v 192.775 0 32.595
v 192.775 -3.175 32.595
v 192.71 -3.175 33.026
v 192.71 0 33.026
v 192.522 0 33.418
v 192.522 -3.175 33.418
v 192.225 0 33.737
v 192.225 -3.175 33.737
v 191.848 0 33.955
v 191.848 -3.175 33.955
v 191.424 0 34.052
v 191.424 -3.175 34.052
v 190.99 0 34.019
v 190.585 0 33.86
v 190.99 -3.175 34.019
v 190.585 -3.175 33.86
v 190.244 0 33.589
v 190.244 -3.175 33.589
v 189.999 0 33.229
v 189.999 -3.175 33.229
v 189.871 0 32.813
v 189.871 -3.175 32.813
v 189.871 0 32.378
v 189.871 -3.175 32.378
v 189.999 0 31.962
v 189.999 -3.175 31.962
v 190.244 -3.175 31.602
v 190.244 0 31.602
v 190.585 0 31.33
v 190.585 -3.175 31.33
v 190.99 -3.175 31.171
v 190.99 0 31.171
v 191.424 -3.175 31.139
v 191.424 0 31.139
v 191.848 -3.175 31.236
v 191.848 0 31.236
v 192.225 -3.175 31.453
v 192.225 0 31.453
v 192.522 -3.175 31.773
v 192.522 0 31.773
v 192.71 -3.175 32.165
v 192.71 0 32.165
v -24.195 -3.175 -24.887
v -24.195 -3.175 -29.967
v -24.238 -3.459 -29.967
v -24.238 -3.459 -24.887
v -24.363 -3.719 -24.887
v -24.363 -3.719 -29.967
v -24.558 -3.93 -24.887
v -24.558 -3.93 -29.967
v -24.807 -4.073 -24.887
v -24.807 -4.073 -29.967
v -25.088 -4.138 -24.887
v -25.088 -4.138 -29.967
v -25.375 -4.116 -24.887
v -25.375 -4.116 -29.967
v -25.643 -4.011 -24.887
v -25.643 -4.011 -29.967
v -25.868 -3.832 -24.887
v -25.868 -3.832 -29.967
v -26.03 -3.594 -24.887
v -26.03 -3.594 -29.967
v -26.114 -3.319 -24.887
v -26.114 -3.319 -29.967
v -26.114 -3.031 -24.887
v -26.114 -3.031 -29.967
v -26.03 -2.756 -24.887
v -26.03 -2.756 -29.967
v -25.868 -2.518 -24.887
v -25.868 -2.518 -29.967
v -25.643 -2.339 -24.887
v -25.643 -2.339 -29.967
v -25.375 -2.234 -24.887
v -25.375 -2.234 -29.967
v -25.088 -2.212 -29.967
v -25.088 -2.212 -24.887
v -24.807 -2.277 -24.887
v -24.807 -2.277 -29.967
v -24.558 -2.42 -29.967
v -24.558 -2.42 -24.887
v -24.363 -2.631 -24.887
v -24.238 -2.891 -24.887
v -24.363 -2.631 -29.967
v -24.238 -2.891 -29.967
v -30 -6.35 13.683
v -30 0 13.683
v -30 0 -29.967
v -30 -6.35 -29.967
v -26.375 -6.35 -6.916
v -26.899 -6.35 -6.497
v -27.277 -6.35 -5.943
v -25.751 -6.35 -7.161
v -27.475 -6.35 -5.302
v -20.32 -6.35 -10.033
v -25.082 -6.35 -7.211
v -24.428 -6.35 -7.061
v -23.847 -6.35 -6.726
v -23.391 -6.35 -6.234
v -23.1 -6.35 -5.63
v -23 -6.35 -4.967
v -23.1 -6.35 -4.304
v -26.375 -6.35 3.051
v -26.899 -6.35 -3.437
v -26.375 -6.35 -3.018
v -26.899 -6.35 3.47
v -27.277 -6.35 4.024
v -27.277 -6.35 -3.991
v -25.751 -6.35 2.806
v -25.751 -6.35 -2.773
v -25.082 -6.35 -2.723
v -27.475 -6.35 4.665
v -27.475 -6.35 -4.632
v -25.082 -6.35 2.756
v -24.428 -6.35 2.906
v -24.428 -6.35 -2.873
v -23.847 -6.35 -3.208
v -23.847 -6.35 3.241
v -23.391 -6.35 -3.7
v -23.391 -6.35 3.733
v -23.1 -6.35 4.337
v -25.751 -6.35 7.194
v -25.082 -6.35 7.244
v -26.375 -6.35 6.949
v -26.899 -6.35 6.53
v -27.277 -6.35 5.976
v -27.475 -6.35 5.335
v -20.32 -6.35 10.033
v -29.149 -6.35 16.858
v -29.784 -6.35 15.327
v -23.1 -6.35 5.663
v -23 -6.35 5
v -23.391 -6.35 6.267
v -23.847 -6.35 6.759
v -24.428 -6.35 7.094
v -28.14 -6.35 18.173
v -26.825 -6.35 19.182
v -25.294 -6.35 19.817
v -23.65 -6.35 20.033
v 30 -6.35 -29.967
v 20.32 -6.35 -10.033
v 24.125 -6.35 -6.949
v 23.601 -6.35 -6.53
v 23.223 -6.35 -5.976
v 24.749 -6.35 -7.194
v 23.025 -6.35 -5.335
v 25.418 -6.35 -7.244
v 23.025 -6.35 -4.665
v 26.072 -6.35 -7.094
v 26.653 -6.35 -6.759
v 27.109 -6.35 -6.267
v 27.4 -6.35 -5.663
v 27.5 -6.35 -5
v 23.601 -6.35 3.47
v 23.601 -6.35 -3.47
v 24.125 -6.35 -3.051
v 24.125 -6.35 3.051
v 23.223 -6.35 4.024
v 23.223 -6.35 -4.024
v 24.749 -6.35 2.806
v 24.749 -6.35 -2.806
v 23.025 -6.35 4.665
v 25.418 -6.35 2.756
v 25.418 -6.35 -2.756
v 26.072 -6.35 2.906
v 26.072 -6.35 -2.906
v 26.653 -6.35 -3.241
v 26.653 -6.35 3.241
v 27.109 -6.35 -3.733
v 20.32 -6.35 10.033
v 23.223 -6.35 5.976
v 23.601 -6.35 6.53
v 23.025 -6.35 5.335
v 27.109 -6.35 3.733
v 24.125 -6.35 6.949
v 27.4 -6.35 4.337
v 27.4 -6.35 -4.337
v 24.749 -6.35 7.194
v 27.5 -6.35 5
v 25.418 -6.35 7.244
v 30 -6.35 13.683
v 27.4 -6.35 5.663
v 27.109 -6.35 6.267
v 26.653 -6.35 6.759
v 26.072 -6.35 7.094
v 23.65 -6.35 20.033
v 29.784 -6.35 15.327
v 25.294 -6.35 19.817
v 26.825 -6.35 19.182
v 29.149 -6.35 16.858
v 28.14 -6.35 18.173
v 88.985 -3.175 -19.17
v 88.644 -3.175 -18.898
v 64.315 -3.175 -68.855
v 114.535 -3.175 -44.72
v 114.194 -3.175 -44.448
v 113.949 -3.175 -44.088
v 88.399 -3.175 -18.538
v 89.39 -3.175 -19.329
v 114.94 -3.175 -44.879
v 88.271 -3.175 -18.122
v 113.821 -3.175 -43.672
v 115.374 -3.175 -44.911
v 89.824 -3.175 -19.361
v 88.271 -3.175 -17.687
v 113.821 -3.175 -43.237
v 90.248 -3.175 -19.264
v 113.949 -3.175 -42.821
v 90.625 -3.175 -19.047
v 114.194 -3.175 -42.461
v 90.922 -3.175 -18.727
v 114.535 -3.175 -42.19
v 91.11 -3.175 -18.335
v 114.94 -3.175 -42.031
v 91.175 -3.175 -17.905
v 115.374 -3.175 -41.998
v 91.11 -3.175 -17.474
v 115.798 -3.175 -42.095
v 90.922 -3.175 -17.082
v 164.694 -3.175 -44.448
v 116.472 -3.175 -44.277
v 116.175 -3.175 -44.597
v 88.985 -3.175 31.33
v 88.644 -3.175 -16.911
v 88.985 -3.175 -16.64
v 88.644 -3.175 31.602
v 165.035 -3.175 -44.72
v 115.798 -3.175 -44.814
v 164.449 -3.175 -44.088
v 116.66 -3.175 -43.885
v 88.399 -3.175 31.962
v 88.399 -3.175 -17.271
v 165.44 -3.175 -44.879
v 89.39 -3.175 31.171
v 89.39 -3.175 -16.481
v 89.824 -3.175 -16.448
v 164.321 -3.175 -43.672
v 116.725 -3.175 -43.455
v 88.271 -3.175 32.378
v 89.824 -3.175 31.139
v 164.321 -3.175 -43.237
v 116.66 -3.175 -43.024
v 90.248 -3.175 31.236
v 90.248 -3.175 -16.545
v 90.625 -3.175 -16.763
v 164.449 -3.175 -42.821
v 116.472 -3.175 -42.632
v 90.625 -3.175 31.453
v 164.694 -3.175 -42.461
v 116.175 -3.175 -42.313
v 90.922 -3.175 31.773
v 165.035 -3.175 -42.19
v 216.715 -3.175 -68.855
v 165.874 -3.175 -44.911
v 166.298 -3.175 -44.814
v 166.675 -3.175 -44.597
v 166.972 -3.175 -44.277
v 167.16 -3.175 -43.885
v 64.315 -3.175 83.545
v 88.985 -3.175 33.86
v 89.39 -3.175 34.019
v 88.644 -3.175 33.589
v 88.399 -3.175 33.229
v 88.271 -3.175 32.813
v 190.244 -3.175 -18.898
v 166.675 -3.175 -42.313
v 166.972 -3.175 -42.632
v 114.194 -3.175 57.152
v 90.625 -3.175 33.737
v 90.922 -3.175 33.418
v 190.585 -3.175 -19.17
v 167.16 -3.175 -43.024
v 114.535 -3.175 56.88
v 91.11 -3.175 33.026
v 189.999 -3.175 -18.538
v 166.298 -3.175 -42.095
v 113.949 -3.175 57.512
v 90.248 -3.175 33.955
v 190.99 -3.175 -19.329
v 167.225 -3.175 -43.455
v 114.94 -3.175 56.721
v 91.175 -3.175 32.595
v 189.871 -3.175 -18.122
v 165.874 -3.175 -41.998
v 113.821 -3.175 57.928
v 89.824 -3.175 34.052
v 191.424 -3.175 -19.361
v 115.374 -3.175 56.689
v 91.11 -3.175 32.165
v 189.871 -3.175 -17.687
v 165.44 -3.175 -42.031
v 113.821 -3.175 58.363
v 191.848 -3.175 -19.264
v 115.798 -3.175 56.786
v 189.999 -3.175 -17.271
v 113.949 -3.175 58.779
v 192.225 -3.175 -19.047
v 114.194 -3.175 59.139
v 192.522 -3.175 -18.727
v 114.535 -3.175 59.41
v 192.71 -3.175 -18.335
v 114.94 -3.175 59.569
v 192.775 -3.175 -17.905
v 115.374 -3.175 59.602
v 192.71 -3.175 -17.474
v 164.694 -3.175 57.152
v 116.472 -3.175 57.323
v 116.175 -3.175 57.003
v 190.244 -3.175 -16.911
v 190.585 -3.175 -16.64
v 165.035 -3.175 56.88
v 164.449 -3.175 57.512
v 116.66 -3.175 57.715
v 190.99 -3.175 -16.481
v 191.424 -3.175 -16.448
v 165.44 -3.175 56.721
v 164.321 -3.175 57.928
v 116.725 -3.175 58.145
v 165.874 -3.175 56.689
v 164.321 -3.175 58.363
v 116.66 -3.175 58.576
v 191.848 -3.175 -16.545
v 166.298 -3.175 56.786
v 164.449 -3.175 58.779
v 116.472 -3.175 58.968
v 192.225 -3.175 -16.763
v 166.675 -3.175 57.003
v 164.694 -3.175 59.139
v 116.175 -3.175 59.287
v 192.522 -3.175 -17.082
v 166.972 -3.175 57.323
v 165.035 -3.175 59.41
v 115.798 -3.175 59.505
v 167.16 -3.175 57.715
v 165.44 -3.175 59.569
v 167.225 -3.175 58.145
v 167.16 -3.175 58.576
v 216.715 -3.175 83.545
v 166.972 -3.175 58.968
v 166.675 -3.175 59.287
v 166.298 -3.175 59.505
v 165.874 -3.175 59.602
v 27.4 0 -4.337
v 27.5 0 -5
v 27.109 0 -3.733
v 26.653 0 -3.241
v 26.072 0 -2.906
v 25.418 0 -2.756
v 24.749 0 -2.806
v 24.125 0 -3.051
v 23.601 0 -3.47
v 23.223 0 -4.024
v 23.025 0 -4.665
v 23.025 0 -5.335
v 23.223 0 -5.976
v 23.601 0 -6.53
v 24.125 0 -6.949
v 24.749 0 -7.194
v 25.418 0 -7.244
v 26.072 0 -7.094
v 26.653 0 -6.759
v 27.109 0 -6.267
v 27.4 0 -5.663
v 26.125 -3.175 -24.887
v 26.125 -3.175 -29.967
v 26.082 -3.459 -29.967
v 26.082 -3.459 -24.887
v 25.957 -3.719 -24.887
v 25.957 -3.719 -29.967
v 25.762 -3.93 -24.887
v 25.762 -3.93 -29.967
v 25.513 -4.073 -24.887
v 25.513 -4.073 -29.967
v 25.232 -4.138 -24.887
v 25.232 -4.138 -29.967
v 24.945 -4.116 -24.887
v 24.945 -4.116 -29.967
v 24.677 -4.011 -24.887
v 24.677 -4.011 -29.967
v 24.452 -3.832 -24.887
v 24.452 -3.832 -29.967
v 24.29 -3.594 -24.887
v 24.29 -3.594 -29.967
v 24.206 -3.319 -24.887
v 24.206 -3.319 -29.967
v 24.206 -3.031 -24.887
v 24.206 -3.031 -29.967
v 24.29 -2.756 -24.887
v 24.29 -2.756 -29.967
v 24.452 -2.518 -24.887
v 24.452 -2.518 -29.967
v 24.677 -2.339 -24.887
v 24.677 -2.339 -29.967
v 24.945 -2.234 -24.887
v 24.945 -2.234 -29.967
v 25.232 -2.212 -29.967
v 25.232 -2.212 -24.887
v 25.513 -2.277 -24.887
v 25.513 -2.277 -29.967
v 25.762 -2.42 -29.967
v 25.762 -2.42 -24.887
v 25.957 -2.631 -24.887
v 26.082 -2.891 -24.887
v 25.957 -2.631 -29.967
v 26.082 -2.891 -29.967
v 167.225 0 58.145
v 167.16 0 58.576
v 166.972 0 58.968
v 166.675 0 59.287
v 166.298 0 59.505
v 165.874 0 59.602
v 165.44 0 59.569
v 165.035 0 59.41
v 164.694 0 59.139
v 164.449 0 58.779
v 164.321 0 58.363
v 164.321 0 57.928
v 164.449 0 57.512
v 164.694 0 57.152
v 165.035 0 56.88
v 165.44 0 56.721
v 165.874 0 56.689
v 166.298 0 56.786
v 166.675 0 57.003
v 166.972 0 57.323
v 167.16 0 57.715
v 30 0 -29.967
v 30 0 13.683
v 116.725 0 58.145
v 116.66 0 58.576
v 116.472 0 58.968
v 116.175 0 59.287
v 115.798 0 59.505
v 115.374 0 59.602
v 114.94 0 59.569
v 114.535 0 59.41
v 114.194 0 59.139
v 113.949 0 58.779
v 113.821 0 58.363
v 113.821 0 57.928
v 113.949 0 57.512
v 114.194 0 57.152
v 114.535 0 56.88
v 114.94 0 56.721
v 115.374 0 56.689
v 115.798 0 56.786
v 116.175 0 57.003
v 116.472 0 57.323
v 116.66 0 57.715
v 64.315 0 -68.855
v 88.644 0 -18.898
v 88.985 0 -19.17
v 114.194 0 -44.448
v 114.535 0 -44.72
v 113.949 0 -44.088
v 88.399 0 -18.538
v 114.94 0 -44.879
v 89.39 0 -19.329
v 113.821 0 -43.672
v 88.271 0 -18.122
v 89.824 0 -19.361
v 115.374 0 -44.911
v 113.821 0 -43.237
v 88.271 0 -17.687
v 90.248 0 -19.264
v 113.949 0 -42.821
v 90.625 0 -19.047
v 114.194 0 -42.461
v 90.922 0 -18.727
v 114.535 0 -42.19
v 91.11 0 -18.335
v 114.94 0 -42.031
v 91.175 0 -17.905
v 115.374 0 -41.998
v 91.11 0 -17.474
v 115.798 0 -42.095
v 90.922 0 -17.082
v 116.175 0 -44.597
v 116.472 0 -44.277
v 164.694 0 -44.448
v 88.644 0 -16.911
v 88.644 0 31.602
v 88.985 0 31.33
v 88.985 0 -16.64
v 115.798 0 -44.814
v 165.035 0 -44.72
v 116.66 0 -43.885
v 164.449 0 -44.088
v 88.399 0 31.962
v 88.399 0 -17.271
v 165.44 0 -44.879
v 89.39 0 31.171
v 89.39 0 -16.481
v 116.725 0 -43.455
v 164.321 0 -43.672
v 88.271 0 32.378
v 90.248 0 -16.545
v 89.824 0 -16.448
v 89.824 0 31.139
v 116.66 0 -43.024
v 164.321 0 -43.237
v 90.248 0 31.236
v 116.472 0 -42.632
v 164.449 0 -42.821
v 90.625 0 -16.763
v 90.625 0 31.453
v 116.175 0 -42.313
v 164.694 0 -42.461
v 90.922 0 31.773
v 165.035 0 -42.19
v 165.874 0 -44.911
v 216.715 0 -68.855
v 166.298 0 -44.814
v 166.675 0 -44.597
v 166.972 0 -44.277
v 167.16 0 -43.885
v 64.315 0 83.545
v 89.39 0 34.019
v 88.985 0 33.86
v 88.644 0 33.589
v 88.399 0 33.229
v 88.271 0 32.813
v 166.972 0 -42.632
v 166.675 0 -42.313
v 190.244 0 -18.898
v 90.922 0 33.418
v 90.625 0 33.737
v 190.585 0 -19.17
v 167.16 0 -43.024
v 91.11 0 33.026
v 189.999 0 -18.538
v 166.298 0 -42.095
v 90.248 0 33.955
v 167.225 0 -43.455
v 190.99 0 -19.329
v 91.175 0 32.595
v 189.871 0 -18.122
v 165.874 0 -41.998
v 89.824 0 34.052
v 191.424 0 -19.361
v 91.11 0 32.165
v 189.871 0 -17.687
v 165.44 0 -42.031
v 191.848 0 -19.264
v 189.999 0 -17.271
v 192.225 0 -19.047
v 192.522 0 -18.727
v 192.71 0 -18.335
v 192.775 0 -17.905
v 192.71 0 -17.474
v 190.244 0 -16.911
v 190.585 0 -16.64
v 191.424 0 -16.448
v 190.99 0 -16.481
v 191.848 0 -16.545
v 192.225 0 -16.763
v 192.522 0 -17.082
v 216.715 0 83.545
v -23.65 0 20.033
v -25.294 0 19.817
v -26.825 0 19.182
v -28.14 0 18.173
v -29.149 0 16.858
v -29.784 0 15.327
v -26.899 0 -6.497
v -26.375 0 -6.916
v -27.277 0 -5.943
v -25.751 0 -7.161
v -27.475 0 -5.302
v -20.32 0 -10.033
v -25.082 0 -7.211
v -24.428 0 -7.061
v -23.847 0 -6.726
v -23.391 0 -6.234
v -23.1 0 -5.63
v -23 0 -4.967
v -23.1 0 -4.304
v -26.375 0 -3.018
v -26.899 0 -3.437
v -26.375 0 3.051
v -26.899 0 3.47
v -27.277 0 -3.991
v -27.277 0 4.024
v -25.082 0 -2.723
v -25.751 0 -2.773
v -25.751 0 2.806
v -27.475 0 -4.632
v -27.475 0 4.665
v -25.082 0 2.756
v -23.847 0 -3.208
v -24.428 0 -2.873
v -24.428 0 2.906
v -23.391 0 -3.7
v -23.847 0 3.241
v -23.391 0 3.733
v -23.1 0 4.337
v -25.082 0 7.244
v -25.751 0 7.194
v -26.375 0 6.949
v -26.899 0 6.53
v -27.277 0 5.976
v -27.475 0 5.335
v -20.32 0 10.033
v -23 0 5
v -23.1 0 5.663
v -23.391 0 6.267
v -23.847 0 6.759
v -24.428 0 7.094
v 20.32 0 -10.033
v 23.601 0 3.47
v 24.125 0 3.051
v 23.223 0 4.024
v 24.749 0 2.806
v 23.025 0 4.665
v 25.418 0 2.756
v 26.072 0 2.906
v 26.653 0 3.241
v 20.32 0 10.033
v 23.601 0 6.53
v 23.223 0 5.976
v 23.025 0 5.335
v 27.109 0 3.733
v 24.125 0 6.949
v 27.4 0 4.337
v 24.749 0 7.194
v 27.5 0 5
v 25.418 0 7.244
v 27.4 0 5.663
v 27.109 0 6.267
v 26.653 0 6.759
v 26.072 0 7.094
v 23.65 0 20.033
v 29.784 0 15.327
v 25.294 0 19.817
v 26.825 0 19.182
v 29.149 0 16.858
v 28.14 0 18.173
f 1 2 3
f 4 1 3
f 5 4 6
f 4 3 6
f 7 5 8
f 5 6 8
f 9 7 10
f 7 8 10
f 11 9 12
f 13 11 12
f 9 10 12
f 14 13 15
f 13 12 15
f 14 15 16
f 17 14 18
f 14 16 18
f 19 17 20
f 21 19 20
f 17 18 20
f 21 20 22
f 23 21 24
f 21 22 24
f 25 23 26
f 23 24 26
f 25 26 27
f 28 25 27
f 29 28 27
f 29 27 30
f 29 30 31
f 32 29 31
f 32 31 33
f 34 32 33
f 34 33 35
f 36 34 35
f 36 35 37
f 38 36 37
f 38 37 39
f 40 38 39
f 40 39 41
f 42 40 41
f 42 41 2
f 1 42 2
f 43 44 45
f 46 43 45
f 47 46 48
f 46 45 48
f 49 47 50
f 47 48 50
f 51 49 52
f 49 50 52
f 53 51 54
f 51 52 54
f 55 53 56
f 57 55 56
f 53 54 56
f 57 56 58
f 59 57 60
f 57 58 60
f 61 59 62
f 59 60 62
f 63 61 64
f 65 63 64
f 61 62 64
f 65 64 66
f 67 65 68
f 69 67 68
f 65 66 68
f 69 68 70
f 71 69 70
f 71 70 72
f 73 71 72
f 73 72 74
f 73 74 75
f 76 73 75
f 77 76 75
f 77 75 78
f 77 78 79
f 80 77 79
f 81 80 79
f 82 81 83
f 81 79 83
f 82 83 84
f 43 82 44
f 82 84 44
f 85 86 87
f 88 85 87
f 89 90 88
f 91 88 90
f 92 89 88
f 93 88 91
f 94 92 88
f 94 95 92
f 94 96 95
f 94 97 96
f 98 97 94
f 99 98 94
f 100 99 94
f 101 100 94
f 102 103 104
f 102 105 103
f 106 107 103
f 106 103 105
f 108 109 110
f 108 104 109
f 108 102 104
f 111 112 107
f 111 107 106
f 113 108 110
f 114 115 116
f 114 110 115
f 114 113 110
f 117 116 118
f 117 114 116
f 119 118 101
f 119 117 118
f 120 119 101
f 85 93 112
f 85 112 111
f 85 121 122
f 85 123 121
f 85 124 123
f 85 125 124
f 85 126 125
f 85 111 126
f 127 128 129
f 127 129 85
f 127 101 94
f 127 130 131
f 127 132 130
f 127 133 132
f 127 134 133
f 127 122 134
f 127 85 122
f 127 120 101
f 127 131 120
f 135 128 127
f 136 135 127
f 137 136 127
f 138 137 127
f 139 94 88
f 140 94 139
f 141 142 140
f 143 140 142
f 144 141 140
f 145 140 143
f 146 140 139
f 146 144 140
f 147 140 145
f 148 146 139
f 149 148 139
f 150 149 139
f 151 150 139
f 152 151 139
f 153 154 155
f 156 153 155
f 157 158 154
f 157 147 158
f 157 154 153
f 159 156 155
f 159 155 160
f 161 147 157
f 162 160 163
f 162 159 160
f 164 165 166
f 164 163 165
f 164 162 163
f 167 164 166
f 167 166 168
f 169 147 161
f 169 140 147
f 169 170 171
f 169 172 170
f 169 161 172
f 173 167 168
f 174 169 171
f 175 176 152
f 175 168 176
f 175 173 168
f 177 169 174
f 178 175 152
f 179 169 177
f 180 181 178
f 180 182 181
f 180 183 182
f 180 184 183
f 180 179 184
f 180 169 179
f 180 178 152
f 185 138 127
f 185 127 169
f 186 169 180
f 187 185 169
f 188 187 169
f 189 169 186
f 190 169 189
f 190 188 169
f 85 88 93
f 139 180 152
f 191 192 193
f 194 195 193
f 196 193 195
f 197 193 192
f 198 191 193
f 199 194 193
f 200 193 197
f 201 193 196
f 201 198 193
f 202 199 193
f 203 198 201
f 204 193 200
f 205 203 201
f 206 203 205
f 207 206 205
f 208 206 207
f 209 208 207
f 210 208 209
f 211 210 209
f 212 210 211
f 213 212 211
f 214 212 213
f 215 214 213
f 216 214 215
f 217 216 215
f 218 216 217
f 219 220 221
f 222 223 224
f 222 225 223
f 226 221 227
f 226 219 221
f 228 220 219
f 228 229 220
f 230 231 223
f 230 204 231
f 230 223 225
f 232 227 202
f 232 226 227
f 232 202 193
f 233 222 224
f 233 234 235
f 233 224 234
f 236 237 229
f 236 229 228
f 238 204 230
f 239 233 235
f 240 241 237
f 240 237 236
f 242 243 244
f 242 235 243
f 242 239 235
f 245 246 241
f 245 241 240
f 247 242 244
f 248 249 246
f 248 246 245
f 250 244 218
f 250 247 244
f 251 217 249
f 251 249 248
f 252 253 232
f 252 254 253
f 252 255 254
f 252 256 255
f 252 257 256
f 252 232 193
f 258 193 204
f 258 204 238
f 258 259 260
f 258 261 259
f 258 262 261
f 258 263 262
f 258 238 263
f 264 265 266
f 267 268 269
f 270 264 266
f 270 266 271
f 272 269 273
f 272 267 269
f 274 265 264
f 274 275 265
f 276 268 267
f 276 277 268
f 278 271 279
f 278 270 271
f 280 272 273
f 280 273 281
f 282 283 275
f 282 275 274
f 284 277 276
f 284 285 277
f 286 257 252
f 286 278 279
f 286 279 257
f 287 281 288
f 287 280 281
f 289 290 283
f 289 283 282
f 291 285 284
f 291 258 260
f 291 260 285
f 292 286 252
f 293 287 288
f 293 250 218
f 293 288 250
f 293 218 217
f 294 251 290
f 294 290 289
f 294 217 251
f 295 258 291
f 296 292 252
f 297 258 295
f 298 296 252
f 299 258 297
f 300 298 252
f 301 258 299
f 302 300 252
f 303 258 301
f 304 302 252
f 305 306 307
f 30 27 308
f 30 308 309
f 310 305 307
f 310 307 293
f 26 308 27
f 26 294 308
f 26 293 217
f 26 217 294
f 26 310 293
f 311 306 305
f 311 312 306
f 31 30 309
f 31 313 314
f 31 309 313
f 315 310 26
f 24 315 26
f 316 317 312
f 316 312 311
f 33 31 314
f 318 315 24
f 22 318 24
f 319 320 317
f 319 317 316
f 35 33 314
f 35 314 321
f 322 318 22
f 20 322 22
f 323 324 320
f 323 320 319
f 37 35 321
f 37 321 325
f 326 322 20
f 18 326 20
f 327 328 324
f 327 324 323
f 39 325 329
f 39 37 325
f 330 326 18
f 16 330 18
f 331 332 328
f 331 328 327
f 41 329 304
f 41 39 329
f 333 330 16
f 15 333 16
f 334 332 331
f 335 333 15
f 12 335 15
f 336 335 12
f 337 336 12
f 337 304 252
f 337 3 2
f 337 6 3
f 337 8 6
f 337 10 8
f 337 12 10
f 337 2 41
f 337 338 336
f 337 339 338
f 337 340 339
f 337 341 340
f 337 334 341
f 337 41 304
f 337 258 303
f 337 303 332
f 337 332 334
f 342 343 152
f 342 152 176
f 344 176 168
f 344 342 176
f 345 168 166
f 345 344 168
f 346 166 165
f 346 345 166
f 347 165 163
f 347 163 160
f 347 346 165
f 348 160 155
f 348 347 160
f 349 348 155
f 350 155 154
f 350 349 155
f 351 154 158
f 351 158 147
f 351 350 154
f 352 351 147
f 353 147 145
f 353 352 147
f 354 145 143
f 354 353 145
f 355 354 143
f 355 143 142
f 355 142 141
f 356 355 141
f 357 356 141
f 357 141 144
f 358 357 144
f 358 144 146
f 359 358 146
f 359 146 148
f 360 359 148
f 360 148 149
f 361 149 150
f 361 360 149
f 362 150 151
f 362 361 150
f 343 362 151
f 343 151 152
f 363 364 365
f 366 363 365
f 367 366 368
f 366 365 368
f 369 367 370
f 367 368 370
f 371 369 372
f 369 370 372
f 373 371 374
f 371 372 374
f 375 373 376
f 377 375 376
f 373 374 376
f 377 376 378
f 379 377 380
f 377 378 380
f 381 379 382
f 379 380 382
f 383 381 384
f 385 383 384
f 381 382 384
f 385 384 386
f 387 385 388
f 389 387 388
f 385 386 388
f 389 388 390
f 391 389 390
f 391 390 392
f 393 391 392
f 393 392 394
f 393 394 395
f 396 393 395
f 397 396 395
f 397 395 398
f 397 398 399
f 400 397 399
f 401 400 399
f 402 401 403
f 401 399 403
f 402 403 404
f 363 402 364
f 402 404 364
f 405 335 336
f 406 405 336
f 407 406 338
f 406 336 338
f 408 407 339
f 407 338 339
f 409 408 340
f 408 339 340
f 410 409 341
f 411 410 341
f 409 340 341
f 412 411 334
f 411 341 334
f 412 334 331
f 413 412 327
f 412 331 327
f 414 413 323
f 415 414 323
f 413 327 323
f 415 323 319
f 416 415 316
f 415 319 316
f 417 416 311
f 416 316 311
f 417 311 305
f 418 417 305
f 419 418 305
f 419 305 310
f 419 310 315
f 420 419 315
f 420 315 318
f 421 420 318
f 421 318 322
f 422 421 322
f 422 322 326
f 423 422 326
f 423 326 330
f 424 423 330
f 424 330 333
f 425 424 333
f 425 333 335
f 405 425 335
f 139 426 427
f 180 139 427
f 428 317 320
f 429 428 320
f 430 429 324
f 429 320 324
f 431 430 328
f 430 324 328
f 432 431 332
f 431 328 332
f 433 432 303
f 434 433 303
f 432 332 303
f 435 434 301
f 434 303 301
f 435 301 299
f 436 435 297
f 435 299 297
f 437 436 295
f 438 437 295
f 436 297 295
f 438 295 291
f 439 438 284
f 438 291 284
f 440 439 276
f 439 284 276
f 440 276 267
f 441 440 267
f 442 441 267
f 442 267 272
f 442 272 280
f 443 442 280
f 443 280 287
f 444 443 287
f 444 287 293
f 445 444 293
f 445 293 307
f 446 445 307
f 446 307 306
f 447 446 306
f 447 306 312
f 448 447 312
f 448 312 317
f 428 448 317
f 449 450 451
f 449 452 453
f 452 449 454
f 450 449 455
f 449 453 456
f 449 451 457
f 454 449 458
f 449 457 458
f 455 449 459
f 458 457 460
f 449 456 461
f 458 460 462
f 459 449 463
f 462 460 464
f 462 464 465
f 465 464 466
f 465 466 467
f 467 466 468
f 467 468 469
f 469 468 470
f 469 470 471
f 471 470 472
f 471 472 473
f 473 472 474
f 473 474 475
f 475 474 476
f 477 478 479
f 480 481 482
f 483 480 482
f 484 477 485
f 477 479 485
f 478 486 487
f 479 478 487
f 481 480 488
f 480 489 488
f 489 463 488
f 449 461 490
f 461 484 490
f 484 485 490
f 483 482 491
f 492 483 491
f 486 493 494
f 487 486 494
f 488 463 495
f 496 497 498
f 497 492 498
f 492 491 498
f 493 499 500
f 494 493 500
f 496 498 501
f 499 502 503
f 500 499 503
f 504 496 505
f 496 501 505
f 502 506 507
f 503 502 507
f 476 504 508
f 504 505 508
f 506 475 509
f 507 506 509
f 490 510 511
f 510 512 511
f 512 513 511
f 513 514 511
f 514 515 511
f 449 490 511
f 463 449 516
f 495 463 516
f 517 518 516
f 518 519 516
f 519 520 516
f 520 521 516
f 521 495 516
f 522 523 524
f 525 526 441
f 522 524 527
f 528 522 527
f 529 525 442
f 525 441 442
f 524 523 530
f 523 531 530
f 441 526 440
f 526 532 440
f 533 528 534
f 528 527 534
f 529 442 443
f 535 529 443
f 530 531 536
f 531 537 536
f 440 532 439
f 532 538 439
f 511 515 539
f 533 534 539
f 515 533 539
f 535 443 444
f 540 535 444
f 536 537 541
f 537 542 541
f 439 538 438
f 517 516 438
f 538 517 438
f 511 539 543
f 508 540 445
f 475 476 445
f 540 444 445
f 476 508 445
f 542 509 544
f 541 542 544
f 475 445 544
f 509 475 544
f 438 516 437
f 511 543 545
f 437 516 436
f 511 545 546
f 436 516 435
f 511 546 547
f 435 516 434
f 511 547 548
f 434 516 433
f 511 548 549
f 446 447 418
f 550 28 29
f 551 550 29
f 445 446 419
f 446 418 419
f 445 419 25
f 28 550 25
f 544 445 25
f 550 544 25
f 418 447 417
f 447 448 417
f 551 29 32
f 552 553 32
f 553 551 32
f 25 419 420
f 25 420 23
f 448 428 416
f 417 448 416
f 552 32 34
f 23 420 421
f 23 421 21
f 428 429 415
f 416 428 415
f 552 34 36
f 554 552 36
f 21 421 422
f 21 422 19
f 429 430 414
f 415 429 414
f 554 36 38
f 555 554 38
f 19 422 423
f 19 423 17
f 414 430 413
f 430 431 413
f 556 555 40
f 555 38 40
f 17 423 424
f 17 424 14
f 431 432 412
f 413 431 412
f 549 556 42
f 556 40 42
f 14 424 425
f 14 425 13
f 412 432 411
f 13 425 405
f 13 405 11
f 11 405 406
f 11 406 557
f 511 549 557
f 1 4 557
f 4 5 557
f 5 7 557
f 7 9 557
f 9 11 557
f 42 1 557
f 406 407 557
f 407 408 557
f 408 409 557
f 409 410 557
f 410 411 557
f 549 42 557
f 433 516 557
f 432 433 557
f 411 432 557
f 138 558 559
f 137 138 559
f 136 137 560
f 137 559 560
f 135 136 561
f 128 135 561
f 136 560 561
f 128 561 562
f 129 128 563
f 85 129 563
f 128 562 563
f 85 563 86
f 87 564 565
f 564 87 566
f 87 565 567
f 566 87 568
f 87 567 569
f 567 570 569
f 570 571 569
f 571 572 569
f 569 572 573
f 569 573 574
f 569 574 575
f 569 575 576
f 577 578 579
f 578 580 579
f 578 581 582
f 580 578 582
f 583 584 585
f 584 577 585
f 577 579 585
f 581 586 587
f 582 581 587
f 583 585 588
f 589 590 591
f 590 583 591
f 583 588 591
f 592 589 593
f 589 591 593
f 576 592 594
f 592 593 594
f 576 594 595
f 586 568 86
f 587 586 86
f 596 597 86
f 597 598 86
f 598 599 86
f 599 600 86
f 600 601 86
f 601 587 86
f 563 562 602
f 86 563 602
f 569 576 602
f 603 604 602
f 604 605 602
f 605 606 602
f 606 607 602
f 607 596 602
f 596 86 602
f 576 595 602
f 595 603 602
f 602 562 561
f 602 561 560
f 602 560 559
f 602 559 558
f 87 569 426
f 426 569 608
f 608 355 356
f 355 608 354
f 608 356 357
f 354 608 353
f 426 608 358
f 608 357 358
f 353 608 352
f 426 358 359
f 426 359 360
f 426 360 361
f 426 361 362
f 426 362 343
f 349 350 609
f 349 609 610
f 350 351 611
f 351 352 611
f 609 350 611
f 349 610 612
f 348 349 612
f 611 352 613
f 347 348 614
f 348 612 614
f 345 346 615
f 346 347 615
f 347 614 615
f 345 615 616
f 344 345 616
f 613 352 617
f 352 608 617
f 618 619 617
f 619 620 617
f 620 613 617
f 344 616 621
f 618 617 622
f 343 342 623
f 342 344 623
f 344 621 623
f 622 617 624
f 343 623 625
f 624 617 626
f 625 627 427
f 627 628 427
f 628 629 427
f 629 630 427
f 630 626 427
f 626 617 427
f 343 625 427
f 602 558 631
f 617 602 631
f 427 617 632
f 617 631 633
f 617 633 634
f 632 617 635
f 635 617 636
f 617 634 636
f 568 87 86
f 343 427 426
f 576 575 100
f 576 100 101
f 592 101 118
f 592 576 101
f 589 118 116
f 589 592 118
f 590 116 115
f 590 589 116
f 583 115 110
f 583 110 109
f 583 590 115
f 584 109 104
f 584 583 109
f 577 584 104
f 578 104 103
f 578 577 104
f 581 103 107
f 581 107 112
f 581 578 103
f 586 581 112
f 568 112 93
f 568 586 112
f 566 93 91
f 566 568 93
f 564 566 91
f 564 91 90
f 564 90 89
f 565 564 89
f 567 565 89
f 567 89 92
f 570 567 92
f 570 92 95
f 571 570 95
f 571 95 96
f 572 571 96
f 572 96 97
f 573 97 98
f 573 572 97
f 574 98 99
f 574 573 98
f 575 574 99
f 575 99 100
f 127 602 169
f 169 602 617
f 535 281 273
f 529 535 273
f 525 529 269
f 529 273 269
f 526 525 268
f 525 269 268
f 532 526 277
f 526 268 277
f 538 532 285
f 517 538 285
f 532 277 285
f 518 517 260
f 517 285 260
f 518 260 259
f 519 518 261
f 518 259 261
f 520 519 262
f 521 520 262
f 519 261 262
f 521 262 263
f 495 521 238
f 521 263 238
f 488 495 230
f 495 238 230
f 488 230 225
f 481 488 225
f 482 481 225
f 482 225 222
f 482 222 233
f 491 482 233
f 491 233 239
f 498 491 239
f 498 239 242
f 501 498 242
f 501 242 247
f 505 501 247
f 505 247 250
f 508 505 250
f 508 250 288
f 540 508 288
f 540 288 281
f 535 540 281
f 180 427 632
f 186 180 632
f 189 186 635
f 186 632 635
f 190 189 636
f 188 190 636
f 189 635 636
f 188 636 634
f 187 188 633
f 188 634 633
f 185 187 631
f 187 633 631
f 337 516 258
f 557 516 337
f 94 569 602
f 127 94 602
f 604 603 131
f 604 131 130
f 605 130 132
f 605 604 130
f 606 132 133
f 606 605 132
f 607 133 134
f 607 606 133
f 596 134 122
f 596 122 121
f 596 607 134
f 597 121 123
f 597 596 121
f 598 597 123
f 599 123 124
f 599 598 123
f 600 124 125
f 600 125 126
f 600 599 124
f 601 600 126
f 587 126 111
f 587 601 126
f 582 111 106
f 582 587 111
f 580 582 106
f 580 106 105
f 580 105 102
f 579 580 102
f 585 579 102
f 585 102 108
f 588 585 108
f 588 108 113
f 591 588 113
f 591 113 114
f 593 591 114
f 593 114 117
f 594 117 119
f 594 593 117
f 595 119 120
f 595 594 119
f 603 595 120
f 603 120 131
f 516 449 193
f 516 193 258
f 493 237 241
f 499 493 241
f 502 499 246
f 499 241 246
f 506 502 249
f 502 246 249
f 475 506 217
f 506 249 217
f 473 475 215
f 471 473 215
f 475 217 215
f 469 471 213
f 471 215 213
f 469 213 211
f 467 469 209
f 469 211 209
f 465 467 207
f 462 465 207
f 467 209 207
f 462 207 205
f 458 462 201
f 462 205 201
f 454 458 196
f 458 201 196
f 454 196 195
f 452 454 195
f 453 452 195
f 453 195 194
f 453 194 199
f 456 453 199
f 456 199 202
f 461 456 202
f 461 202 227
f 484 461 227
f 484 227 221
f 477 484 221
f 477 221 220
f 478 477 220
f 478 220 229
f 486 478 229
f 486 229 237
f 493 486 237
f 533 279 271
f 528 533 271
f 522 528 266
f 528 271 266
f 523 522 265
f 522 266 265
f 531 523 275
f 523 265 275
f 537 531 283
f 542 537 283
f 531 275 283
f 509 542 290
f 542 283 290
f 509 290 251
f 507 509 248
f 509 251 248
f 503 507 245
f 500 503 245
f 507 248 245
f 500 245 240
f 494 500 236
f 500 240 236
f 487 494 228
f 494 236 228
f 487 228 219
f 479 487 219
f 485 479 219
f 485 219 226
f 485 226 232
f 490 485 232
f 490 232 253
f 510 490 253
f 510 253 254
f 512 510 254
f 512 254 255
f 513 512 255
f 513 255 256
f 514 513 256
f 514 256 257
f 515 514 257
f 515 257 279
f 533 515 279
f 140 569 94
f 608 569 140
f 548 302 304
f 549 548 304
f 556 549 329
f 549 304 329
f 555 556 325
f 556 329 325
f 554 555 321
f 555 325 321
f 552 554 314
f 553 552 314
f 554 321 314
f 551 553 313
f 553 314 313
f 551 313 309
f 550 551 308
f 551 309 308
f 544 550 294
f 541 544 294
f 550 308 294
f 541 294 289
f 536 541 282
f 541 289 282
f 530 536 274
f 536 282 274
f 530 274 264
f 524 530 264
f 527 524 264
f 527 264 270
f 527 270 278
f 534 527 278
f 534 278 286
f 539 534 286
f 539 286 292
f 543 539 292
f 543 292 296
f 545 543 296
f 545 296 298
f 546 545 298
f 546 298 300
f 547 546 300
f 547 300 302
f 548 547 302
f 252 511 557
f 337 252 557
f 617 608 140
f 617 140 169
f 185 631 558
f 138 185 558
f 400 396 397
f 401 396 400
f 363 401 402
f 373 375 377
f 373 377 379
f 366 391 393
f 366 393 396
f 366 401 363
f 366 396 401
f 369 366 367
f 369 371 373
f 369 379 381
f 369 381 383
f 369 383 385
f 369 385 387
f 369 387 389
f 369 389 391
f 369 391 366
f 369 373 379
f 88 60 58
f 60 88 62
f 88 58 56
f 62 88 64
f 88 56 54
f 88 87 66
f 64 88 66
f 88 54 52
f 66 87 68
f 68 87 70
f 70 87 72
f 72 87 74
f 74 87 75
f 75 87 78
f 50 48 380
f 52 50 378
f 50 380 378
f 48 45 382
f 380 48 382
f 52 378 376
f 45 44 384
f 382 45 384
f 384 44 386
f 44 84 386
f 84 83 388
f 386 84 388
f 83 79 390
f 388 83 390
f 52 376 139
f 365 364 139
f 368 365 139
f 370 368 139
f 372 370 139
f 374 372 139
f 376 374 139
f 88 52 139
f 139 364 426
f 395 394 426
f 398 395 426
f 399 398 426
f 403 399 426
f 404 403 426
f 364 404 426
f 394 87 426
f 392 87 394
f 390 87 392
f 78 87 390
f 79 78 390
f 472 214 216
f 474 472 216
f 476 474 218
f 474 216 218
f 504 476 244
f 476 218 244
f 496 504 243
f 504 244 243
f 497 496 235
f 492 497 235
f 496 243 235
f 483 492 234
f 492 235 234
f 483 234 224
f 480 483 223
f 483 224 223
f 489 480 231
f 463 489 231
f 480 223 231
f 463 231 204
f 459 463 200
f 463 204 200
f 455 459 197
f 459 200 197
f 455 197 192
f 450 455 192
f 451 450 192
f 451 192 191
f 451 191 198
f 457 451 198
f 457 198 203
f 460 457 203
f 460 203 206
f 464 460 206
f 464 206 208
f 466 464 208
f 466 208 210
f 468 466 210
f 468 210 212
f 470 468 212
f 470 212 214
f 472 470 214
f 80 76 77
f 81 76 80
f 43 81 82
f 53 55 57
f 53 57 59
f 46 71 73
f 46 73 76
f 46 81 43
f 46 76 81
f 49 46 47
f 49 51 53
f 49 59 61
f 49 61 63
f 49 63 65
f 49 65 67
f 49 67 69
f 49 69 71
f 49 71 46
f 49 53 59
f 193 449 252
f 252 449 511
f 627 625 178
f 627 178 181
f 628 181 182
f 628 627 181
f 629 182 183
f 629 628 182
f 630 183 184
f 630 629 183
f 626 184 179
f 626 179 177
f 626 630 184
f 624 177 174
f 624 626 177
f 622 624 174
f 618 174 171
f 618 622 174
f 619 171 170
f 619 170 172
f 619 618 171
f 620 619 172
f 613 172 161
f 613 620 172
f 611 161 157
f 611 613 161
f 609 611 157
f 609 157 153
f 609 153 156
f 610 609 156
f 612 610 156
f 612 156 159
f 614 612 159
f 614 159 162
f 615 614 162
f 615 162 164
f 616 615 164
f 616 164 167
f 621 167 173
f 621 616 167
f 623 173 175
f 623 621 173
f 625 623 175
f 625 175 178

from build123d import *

# Parameters (mm, degrees)
F0_R     = 2.25
F0_W     = 40.64
F0_H     = 20.066
F1_DEPTH = 6.35
F2_W     = 152.4
F2_H     = 152.4
F3_DEPTH = 3.175
F4_R     = 1.4605
F5_DEPTH = 25.4
F6_R     = 0.9652
F7_DEPTH = 5.08


with BuildPart() as f1:
    # F0 (on Front) → F1 (new body)
    with BuildSketch(Plane.XZ):
        with BuildLine():
            ThreePointArc((30, 13.683), (28.140128, 18.173128), (23.65, 20.033))
            Line((23.65, 20.033), (-23.65, 20.033))
            ThreePointArc((-23.65, 20.033), (-28.140128, 18.173128), (-30, 13.683))
            Line((-30, 13.683), (-30, -29.967))
            Line((-30, -29.967), (-25.25, -29.967))
            Line((-25.25, -29.967), (25.25, -29.967))
            Line((25.25, -29.967), (30, -29.967))
            Line((30, -29.967), (30, 13.683))
        make_face()
        with Locations((25.25, -5)):
            Circle(F0_R, mode=Mode.SUBTRACT)
        with Locations((-25.25, -4.967)):
            Circle(F0_R, mode=Mode.SUBTRACT)
        with Locations((-25.25, 5)):
            Circle(F0_R, mode=Mode.SUBTRACT)
        Rectangle(F0_W, F0_H, mode=Mode.SUBTRACT)
        with Locations((25.25, 5)):
            Circle(F0_R, mode=Mode.SUBTRACT)
    extrude(amount=F1_DEPTH)

    # F6 (on face) → F7 (cut)
    with BuildSketch(Plane(origin=(0, 0, -29.967), x_dir=(1, 0, 0), z_dir=(0, 0, -1))):
        with Locations((-25.16, 3.175)):
            Circle(F6_R)
        with Locations((25.16, 3.175)):
            Circle(F6_R)
    extrude(amount=-F7_DEPTH, mode=Mode.SUBTRACT)


with BuildPart() as f3:
    # F2 (on Front) → F3 (new body)
    with BuildSketch(Plane.XZ):
        with Locations((140.514857, 7.345255)):
            Rectangle(F2_W, F2_H)
    extrude(amount=F3_DEPTH)

    # F4 (on face) → F5 (cut)
    with BuildSketch(Plane.XZ.offset(3.175)):
        with Locations((191.314857, 32.595255)):
            Circle(F4_R)
        with Locations((165.764857, 58.145255)):
            Circle(F4_R)
        with Locations((115.264857, 58.145255)):
            Circle(F4_R)
        with Locations((89.714857, 32.595255)):
            Circle(F4_R)
        with Locations((89.714857, -17.904745)):
            Circle(F4_R)
        with Locations((115.264857, -43.454745)):
            Circle(F4_R)
        with Locations((165.764857, -43.454745)):
            Circle(F4_R)
        with Locations((191.314857, -17.904745)):
            Circle(F4_R)
    extrude(amount=-F5_DEPTH, mode=Mode.SUBTRACT)


solid = Compound([f1.part, f3.part])
